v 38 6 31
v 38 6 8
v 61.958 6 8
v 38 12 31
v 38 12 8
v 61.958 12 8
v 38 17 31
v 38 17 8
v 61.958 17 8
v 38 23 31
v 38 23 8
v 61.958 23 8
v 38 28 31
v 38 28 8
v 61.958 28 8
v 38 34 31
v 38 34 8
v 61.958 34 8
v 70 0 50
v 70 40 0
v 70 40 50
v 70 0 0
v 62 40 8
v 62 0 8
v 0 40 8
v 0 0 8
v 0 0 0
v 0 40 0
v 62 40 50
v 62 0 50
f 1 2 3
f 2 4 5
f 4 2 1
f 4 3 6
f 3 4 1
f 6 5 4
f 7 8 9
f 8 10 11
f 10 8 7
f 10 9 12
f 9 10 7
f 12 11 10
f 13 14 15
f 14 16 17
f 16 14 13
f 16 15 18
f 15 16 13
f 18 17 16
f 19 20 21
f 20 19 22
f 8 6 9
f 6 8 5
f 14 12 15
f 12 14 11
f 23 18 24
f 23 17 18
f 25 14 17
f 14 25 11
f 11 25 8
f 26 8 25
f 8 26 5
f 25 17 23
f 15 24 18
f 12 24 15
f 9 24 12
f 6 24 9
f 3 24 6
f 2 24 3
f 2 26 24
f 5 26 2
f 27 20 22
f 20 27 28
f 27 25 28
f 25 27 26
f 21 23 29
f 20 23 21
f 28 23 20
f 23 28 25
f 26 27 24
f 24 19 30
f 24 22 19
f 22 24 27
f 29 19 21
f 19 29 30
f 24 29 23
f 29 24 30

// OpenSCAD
$fn = 32;

// ----------------------------------------------------------------------
// Rib bracket: 3-gusset L bracket
// ----------------------------------------------------------------------

// --- parameters (mm) ---
base_l = 70;              // foot length, X
base_w = 40;              // foot width, Y
base_t = 8;               // foot thickness
plate_t = 8;              // upright plate thickness
plate_h = 50;             // overall height
gus_l = 24;               // gusset leg along the foot
gus_h = 24;               // gusset height
gus_t = 6;                // gusset thickness
gus_edge = 6;             // gusset margin from the foot edge
n_gus = 3;                // gusset count

gus_pitch = (base_w - 2 * gus_edge - gus_t) / (n_gus - 1);  // gusset pitch

union() {
  cube([base_l, base_w, base_t]);
  translate([base_l - plate_t, 0, base_t - 1])
    cube([plate_t, base_w, plate_h - base_t + 1]);
  for (i = [0 : n_gus - 1])
    translate([base_l - plate_t - gus_l, gus_edge + i * gus_pitch, base_t - 1])
      rotate([-90, 0, 0])
        linear_extrude(height = gus_t)
          polygon(points = [[0, 0], [gus_l + 1, 0], [0, -gus_h]]);
}
